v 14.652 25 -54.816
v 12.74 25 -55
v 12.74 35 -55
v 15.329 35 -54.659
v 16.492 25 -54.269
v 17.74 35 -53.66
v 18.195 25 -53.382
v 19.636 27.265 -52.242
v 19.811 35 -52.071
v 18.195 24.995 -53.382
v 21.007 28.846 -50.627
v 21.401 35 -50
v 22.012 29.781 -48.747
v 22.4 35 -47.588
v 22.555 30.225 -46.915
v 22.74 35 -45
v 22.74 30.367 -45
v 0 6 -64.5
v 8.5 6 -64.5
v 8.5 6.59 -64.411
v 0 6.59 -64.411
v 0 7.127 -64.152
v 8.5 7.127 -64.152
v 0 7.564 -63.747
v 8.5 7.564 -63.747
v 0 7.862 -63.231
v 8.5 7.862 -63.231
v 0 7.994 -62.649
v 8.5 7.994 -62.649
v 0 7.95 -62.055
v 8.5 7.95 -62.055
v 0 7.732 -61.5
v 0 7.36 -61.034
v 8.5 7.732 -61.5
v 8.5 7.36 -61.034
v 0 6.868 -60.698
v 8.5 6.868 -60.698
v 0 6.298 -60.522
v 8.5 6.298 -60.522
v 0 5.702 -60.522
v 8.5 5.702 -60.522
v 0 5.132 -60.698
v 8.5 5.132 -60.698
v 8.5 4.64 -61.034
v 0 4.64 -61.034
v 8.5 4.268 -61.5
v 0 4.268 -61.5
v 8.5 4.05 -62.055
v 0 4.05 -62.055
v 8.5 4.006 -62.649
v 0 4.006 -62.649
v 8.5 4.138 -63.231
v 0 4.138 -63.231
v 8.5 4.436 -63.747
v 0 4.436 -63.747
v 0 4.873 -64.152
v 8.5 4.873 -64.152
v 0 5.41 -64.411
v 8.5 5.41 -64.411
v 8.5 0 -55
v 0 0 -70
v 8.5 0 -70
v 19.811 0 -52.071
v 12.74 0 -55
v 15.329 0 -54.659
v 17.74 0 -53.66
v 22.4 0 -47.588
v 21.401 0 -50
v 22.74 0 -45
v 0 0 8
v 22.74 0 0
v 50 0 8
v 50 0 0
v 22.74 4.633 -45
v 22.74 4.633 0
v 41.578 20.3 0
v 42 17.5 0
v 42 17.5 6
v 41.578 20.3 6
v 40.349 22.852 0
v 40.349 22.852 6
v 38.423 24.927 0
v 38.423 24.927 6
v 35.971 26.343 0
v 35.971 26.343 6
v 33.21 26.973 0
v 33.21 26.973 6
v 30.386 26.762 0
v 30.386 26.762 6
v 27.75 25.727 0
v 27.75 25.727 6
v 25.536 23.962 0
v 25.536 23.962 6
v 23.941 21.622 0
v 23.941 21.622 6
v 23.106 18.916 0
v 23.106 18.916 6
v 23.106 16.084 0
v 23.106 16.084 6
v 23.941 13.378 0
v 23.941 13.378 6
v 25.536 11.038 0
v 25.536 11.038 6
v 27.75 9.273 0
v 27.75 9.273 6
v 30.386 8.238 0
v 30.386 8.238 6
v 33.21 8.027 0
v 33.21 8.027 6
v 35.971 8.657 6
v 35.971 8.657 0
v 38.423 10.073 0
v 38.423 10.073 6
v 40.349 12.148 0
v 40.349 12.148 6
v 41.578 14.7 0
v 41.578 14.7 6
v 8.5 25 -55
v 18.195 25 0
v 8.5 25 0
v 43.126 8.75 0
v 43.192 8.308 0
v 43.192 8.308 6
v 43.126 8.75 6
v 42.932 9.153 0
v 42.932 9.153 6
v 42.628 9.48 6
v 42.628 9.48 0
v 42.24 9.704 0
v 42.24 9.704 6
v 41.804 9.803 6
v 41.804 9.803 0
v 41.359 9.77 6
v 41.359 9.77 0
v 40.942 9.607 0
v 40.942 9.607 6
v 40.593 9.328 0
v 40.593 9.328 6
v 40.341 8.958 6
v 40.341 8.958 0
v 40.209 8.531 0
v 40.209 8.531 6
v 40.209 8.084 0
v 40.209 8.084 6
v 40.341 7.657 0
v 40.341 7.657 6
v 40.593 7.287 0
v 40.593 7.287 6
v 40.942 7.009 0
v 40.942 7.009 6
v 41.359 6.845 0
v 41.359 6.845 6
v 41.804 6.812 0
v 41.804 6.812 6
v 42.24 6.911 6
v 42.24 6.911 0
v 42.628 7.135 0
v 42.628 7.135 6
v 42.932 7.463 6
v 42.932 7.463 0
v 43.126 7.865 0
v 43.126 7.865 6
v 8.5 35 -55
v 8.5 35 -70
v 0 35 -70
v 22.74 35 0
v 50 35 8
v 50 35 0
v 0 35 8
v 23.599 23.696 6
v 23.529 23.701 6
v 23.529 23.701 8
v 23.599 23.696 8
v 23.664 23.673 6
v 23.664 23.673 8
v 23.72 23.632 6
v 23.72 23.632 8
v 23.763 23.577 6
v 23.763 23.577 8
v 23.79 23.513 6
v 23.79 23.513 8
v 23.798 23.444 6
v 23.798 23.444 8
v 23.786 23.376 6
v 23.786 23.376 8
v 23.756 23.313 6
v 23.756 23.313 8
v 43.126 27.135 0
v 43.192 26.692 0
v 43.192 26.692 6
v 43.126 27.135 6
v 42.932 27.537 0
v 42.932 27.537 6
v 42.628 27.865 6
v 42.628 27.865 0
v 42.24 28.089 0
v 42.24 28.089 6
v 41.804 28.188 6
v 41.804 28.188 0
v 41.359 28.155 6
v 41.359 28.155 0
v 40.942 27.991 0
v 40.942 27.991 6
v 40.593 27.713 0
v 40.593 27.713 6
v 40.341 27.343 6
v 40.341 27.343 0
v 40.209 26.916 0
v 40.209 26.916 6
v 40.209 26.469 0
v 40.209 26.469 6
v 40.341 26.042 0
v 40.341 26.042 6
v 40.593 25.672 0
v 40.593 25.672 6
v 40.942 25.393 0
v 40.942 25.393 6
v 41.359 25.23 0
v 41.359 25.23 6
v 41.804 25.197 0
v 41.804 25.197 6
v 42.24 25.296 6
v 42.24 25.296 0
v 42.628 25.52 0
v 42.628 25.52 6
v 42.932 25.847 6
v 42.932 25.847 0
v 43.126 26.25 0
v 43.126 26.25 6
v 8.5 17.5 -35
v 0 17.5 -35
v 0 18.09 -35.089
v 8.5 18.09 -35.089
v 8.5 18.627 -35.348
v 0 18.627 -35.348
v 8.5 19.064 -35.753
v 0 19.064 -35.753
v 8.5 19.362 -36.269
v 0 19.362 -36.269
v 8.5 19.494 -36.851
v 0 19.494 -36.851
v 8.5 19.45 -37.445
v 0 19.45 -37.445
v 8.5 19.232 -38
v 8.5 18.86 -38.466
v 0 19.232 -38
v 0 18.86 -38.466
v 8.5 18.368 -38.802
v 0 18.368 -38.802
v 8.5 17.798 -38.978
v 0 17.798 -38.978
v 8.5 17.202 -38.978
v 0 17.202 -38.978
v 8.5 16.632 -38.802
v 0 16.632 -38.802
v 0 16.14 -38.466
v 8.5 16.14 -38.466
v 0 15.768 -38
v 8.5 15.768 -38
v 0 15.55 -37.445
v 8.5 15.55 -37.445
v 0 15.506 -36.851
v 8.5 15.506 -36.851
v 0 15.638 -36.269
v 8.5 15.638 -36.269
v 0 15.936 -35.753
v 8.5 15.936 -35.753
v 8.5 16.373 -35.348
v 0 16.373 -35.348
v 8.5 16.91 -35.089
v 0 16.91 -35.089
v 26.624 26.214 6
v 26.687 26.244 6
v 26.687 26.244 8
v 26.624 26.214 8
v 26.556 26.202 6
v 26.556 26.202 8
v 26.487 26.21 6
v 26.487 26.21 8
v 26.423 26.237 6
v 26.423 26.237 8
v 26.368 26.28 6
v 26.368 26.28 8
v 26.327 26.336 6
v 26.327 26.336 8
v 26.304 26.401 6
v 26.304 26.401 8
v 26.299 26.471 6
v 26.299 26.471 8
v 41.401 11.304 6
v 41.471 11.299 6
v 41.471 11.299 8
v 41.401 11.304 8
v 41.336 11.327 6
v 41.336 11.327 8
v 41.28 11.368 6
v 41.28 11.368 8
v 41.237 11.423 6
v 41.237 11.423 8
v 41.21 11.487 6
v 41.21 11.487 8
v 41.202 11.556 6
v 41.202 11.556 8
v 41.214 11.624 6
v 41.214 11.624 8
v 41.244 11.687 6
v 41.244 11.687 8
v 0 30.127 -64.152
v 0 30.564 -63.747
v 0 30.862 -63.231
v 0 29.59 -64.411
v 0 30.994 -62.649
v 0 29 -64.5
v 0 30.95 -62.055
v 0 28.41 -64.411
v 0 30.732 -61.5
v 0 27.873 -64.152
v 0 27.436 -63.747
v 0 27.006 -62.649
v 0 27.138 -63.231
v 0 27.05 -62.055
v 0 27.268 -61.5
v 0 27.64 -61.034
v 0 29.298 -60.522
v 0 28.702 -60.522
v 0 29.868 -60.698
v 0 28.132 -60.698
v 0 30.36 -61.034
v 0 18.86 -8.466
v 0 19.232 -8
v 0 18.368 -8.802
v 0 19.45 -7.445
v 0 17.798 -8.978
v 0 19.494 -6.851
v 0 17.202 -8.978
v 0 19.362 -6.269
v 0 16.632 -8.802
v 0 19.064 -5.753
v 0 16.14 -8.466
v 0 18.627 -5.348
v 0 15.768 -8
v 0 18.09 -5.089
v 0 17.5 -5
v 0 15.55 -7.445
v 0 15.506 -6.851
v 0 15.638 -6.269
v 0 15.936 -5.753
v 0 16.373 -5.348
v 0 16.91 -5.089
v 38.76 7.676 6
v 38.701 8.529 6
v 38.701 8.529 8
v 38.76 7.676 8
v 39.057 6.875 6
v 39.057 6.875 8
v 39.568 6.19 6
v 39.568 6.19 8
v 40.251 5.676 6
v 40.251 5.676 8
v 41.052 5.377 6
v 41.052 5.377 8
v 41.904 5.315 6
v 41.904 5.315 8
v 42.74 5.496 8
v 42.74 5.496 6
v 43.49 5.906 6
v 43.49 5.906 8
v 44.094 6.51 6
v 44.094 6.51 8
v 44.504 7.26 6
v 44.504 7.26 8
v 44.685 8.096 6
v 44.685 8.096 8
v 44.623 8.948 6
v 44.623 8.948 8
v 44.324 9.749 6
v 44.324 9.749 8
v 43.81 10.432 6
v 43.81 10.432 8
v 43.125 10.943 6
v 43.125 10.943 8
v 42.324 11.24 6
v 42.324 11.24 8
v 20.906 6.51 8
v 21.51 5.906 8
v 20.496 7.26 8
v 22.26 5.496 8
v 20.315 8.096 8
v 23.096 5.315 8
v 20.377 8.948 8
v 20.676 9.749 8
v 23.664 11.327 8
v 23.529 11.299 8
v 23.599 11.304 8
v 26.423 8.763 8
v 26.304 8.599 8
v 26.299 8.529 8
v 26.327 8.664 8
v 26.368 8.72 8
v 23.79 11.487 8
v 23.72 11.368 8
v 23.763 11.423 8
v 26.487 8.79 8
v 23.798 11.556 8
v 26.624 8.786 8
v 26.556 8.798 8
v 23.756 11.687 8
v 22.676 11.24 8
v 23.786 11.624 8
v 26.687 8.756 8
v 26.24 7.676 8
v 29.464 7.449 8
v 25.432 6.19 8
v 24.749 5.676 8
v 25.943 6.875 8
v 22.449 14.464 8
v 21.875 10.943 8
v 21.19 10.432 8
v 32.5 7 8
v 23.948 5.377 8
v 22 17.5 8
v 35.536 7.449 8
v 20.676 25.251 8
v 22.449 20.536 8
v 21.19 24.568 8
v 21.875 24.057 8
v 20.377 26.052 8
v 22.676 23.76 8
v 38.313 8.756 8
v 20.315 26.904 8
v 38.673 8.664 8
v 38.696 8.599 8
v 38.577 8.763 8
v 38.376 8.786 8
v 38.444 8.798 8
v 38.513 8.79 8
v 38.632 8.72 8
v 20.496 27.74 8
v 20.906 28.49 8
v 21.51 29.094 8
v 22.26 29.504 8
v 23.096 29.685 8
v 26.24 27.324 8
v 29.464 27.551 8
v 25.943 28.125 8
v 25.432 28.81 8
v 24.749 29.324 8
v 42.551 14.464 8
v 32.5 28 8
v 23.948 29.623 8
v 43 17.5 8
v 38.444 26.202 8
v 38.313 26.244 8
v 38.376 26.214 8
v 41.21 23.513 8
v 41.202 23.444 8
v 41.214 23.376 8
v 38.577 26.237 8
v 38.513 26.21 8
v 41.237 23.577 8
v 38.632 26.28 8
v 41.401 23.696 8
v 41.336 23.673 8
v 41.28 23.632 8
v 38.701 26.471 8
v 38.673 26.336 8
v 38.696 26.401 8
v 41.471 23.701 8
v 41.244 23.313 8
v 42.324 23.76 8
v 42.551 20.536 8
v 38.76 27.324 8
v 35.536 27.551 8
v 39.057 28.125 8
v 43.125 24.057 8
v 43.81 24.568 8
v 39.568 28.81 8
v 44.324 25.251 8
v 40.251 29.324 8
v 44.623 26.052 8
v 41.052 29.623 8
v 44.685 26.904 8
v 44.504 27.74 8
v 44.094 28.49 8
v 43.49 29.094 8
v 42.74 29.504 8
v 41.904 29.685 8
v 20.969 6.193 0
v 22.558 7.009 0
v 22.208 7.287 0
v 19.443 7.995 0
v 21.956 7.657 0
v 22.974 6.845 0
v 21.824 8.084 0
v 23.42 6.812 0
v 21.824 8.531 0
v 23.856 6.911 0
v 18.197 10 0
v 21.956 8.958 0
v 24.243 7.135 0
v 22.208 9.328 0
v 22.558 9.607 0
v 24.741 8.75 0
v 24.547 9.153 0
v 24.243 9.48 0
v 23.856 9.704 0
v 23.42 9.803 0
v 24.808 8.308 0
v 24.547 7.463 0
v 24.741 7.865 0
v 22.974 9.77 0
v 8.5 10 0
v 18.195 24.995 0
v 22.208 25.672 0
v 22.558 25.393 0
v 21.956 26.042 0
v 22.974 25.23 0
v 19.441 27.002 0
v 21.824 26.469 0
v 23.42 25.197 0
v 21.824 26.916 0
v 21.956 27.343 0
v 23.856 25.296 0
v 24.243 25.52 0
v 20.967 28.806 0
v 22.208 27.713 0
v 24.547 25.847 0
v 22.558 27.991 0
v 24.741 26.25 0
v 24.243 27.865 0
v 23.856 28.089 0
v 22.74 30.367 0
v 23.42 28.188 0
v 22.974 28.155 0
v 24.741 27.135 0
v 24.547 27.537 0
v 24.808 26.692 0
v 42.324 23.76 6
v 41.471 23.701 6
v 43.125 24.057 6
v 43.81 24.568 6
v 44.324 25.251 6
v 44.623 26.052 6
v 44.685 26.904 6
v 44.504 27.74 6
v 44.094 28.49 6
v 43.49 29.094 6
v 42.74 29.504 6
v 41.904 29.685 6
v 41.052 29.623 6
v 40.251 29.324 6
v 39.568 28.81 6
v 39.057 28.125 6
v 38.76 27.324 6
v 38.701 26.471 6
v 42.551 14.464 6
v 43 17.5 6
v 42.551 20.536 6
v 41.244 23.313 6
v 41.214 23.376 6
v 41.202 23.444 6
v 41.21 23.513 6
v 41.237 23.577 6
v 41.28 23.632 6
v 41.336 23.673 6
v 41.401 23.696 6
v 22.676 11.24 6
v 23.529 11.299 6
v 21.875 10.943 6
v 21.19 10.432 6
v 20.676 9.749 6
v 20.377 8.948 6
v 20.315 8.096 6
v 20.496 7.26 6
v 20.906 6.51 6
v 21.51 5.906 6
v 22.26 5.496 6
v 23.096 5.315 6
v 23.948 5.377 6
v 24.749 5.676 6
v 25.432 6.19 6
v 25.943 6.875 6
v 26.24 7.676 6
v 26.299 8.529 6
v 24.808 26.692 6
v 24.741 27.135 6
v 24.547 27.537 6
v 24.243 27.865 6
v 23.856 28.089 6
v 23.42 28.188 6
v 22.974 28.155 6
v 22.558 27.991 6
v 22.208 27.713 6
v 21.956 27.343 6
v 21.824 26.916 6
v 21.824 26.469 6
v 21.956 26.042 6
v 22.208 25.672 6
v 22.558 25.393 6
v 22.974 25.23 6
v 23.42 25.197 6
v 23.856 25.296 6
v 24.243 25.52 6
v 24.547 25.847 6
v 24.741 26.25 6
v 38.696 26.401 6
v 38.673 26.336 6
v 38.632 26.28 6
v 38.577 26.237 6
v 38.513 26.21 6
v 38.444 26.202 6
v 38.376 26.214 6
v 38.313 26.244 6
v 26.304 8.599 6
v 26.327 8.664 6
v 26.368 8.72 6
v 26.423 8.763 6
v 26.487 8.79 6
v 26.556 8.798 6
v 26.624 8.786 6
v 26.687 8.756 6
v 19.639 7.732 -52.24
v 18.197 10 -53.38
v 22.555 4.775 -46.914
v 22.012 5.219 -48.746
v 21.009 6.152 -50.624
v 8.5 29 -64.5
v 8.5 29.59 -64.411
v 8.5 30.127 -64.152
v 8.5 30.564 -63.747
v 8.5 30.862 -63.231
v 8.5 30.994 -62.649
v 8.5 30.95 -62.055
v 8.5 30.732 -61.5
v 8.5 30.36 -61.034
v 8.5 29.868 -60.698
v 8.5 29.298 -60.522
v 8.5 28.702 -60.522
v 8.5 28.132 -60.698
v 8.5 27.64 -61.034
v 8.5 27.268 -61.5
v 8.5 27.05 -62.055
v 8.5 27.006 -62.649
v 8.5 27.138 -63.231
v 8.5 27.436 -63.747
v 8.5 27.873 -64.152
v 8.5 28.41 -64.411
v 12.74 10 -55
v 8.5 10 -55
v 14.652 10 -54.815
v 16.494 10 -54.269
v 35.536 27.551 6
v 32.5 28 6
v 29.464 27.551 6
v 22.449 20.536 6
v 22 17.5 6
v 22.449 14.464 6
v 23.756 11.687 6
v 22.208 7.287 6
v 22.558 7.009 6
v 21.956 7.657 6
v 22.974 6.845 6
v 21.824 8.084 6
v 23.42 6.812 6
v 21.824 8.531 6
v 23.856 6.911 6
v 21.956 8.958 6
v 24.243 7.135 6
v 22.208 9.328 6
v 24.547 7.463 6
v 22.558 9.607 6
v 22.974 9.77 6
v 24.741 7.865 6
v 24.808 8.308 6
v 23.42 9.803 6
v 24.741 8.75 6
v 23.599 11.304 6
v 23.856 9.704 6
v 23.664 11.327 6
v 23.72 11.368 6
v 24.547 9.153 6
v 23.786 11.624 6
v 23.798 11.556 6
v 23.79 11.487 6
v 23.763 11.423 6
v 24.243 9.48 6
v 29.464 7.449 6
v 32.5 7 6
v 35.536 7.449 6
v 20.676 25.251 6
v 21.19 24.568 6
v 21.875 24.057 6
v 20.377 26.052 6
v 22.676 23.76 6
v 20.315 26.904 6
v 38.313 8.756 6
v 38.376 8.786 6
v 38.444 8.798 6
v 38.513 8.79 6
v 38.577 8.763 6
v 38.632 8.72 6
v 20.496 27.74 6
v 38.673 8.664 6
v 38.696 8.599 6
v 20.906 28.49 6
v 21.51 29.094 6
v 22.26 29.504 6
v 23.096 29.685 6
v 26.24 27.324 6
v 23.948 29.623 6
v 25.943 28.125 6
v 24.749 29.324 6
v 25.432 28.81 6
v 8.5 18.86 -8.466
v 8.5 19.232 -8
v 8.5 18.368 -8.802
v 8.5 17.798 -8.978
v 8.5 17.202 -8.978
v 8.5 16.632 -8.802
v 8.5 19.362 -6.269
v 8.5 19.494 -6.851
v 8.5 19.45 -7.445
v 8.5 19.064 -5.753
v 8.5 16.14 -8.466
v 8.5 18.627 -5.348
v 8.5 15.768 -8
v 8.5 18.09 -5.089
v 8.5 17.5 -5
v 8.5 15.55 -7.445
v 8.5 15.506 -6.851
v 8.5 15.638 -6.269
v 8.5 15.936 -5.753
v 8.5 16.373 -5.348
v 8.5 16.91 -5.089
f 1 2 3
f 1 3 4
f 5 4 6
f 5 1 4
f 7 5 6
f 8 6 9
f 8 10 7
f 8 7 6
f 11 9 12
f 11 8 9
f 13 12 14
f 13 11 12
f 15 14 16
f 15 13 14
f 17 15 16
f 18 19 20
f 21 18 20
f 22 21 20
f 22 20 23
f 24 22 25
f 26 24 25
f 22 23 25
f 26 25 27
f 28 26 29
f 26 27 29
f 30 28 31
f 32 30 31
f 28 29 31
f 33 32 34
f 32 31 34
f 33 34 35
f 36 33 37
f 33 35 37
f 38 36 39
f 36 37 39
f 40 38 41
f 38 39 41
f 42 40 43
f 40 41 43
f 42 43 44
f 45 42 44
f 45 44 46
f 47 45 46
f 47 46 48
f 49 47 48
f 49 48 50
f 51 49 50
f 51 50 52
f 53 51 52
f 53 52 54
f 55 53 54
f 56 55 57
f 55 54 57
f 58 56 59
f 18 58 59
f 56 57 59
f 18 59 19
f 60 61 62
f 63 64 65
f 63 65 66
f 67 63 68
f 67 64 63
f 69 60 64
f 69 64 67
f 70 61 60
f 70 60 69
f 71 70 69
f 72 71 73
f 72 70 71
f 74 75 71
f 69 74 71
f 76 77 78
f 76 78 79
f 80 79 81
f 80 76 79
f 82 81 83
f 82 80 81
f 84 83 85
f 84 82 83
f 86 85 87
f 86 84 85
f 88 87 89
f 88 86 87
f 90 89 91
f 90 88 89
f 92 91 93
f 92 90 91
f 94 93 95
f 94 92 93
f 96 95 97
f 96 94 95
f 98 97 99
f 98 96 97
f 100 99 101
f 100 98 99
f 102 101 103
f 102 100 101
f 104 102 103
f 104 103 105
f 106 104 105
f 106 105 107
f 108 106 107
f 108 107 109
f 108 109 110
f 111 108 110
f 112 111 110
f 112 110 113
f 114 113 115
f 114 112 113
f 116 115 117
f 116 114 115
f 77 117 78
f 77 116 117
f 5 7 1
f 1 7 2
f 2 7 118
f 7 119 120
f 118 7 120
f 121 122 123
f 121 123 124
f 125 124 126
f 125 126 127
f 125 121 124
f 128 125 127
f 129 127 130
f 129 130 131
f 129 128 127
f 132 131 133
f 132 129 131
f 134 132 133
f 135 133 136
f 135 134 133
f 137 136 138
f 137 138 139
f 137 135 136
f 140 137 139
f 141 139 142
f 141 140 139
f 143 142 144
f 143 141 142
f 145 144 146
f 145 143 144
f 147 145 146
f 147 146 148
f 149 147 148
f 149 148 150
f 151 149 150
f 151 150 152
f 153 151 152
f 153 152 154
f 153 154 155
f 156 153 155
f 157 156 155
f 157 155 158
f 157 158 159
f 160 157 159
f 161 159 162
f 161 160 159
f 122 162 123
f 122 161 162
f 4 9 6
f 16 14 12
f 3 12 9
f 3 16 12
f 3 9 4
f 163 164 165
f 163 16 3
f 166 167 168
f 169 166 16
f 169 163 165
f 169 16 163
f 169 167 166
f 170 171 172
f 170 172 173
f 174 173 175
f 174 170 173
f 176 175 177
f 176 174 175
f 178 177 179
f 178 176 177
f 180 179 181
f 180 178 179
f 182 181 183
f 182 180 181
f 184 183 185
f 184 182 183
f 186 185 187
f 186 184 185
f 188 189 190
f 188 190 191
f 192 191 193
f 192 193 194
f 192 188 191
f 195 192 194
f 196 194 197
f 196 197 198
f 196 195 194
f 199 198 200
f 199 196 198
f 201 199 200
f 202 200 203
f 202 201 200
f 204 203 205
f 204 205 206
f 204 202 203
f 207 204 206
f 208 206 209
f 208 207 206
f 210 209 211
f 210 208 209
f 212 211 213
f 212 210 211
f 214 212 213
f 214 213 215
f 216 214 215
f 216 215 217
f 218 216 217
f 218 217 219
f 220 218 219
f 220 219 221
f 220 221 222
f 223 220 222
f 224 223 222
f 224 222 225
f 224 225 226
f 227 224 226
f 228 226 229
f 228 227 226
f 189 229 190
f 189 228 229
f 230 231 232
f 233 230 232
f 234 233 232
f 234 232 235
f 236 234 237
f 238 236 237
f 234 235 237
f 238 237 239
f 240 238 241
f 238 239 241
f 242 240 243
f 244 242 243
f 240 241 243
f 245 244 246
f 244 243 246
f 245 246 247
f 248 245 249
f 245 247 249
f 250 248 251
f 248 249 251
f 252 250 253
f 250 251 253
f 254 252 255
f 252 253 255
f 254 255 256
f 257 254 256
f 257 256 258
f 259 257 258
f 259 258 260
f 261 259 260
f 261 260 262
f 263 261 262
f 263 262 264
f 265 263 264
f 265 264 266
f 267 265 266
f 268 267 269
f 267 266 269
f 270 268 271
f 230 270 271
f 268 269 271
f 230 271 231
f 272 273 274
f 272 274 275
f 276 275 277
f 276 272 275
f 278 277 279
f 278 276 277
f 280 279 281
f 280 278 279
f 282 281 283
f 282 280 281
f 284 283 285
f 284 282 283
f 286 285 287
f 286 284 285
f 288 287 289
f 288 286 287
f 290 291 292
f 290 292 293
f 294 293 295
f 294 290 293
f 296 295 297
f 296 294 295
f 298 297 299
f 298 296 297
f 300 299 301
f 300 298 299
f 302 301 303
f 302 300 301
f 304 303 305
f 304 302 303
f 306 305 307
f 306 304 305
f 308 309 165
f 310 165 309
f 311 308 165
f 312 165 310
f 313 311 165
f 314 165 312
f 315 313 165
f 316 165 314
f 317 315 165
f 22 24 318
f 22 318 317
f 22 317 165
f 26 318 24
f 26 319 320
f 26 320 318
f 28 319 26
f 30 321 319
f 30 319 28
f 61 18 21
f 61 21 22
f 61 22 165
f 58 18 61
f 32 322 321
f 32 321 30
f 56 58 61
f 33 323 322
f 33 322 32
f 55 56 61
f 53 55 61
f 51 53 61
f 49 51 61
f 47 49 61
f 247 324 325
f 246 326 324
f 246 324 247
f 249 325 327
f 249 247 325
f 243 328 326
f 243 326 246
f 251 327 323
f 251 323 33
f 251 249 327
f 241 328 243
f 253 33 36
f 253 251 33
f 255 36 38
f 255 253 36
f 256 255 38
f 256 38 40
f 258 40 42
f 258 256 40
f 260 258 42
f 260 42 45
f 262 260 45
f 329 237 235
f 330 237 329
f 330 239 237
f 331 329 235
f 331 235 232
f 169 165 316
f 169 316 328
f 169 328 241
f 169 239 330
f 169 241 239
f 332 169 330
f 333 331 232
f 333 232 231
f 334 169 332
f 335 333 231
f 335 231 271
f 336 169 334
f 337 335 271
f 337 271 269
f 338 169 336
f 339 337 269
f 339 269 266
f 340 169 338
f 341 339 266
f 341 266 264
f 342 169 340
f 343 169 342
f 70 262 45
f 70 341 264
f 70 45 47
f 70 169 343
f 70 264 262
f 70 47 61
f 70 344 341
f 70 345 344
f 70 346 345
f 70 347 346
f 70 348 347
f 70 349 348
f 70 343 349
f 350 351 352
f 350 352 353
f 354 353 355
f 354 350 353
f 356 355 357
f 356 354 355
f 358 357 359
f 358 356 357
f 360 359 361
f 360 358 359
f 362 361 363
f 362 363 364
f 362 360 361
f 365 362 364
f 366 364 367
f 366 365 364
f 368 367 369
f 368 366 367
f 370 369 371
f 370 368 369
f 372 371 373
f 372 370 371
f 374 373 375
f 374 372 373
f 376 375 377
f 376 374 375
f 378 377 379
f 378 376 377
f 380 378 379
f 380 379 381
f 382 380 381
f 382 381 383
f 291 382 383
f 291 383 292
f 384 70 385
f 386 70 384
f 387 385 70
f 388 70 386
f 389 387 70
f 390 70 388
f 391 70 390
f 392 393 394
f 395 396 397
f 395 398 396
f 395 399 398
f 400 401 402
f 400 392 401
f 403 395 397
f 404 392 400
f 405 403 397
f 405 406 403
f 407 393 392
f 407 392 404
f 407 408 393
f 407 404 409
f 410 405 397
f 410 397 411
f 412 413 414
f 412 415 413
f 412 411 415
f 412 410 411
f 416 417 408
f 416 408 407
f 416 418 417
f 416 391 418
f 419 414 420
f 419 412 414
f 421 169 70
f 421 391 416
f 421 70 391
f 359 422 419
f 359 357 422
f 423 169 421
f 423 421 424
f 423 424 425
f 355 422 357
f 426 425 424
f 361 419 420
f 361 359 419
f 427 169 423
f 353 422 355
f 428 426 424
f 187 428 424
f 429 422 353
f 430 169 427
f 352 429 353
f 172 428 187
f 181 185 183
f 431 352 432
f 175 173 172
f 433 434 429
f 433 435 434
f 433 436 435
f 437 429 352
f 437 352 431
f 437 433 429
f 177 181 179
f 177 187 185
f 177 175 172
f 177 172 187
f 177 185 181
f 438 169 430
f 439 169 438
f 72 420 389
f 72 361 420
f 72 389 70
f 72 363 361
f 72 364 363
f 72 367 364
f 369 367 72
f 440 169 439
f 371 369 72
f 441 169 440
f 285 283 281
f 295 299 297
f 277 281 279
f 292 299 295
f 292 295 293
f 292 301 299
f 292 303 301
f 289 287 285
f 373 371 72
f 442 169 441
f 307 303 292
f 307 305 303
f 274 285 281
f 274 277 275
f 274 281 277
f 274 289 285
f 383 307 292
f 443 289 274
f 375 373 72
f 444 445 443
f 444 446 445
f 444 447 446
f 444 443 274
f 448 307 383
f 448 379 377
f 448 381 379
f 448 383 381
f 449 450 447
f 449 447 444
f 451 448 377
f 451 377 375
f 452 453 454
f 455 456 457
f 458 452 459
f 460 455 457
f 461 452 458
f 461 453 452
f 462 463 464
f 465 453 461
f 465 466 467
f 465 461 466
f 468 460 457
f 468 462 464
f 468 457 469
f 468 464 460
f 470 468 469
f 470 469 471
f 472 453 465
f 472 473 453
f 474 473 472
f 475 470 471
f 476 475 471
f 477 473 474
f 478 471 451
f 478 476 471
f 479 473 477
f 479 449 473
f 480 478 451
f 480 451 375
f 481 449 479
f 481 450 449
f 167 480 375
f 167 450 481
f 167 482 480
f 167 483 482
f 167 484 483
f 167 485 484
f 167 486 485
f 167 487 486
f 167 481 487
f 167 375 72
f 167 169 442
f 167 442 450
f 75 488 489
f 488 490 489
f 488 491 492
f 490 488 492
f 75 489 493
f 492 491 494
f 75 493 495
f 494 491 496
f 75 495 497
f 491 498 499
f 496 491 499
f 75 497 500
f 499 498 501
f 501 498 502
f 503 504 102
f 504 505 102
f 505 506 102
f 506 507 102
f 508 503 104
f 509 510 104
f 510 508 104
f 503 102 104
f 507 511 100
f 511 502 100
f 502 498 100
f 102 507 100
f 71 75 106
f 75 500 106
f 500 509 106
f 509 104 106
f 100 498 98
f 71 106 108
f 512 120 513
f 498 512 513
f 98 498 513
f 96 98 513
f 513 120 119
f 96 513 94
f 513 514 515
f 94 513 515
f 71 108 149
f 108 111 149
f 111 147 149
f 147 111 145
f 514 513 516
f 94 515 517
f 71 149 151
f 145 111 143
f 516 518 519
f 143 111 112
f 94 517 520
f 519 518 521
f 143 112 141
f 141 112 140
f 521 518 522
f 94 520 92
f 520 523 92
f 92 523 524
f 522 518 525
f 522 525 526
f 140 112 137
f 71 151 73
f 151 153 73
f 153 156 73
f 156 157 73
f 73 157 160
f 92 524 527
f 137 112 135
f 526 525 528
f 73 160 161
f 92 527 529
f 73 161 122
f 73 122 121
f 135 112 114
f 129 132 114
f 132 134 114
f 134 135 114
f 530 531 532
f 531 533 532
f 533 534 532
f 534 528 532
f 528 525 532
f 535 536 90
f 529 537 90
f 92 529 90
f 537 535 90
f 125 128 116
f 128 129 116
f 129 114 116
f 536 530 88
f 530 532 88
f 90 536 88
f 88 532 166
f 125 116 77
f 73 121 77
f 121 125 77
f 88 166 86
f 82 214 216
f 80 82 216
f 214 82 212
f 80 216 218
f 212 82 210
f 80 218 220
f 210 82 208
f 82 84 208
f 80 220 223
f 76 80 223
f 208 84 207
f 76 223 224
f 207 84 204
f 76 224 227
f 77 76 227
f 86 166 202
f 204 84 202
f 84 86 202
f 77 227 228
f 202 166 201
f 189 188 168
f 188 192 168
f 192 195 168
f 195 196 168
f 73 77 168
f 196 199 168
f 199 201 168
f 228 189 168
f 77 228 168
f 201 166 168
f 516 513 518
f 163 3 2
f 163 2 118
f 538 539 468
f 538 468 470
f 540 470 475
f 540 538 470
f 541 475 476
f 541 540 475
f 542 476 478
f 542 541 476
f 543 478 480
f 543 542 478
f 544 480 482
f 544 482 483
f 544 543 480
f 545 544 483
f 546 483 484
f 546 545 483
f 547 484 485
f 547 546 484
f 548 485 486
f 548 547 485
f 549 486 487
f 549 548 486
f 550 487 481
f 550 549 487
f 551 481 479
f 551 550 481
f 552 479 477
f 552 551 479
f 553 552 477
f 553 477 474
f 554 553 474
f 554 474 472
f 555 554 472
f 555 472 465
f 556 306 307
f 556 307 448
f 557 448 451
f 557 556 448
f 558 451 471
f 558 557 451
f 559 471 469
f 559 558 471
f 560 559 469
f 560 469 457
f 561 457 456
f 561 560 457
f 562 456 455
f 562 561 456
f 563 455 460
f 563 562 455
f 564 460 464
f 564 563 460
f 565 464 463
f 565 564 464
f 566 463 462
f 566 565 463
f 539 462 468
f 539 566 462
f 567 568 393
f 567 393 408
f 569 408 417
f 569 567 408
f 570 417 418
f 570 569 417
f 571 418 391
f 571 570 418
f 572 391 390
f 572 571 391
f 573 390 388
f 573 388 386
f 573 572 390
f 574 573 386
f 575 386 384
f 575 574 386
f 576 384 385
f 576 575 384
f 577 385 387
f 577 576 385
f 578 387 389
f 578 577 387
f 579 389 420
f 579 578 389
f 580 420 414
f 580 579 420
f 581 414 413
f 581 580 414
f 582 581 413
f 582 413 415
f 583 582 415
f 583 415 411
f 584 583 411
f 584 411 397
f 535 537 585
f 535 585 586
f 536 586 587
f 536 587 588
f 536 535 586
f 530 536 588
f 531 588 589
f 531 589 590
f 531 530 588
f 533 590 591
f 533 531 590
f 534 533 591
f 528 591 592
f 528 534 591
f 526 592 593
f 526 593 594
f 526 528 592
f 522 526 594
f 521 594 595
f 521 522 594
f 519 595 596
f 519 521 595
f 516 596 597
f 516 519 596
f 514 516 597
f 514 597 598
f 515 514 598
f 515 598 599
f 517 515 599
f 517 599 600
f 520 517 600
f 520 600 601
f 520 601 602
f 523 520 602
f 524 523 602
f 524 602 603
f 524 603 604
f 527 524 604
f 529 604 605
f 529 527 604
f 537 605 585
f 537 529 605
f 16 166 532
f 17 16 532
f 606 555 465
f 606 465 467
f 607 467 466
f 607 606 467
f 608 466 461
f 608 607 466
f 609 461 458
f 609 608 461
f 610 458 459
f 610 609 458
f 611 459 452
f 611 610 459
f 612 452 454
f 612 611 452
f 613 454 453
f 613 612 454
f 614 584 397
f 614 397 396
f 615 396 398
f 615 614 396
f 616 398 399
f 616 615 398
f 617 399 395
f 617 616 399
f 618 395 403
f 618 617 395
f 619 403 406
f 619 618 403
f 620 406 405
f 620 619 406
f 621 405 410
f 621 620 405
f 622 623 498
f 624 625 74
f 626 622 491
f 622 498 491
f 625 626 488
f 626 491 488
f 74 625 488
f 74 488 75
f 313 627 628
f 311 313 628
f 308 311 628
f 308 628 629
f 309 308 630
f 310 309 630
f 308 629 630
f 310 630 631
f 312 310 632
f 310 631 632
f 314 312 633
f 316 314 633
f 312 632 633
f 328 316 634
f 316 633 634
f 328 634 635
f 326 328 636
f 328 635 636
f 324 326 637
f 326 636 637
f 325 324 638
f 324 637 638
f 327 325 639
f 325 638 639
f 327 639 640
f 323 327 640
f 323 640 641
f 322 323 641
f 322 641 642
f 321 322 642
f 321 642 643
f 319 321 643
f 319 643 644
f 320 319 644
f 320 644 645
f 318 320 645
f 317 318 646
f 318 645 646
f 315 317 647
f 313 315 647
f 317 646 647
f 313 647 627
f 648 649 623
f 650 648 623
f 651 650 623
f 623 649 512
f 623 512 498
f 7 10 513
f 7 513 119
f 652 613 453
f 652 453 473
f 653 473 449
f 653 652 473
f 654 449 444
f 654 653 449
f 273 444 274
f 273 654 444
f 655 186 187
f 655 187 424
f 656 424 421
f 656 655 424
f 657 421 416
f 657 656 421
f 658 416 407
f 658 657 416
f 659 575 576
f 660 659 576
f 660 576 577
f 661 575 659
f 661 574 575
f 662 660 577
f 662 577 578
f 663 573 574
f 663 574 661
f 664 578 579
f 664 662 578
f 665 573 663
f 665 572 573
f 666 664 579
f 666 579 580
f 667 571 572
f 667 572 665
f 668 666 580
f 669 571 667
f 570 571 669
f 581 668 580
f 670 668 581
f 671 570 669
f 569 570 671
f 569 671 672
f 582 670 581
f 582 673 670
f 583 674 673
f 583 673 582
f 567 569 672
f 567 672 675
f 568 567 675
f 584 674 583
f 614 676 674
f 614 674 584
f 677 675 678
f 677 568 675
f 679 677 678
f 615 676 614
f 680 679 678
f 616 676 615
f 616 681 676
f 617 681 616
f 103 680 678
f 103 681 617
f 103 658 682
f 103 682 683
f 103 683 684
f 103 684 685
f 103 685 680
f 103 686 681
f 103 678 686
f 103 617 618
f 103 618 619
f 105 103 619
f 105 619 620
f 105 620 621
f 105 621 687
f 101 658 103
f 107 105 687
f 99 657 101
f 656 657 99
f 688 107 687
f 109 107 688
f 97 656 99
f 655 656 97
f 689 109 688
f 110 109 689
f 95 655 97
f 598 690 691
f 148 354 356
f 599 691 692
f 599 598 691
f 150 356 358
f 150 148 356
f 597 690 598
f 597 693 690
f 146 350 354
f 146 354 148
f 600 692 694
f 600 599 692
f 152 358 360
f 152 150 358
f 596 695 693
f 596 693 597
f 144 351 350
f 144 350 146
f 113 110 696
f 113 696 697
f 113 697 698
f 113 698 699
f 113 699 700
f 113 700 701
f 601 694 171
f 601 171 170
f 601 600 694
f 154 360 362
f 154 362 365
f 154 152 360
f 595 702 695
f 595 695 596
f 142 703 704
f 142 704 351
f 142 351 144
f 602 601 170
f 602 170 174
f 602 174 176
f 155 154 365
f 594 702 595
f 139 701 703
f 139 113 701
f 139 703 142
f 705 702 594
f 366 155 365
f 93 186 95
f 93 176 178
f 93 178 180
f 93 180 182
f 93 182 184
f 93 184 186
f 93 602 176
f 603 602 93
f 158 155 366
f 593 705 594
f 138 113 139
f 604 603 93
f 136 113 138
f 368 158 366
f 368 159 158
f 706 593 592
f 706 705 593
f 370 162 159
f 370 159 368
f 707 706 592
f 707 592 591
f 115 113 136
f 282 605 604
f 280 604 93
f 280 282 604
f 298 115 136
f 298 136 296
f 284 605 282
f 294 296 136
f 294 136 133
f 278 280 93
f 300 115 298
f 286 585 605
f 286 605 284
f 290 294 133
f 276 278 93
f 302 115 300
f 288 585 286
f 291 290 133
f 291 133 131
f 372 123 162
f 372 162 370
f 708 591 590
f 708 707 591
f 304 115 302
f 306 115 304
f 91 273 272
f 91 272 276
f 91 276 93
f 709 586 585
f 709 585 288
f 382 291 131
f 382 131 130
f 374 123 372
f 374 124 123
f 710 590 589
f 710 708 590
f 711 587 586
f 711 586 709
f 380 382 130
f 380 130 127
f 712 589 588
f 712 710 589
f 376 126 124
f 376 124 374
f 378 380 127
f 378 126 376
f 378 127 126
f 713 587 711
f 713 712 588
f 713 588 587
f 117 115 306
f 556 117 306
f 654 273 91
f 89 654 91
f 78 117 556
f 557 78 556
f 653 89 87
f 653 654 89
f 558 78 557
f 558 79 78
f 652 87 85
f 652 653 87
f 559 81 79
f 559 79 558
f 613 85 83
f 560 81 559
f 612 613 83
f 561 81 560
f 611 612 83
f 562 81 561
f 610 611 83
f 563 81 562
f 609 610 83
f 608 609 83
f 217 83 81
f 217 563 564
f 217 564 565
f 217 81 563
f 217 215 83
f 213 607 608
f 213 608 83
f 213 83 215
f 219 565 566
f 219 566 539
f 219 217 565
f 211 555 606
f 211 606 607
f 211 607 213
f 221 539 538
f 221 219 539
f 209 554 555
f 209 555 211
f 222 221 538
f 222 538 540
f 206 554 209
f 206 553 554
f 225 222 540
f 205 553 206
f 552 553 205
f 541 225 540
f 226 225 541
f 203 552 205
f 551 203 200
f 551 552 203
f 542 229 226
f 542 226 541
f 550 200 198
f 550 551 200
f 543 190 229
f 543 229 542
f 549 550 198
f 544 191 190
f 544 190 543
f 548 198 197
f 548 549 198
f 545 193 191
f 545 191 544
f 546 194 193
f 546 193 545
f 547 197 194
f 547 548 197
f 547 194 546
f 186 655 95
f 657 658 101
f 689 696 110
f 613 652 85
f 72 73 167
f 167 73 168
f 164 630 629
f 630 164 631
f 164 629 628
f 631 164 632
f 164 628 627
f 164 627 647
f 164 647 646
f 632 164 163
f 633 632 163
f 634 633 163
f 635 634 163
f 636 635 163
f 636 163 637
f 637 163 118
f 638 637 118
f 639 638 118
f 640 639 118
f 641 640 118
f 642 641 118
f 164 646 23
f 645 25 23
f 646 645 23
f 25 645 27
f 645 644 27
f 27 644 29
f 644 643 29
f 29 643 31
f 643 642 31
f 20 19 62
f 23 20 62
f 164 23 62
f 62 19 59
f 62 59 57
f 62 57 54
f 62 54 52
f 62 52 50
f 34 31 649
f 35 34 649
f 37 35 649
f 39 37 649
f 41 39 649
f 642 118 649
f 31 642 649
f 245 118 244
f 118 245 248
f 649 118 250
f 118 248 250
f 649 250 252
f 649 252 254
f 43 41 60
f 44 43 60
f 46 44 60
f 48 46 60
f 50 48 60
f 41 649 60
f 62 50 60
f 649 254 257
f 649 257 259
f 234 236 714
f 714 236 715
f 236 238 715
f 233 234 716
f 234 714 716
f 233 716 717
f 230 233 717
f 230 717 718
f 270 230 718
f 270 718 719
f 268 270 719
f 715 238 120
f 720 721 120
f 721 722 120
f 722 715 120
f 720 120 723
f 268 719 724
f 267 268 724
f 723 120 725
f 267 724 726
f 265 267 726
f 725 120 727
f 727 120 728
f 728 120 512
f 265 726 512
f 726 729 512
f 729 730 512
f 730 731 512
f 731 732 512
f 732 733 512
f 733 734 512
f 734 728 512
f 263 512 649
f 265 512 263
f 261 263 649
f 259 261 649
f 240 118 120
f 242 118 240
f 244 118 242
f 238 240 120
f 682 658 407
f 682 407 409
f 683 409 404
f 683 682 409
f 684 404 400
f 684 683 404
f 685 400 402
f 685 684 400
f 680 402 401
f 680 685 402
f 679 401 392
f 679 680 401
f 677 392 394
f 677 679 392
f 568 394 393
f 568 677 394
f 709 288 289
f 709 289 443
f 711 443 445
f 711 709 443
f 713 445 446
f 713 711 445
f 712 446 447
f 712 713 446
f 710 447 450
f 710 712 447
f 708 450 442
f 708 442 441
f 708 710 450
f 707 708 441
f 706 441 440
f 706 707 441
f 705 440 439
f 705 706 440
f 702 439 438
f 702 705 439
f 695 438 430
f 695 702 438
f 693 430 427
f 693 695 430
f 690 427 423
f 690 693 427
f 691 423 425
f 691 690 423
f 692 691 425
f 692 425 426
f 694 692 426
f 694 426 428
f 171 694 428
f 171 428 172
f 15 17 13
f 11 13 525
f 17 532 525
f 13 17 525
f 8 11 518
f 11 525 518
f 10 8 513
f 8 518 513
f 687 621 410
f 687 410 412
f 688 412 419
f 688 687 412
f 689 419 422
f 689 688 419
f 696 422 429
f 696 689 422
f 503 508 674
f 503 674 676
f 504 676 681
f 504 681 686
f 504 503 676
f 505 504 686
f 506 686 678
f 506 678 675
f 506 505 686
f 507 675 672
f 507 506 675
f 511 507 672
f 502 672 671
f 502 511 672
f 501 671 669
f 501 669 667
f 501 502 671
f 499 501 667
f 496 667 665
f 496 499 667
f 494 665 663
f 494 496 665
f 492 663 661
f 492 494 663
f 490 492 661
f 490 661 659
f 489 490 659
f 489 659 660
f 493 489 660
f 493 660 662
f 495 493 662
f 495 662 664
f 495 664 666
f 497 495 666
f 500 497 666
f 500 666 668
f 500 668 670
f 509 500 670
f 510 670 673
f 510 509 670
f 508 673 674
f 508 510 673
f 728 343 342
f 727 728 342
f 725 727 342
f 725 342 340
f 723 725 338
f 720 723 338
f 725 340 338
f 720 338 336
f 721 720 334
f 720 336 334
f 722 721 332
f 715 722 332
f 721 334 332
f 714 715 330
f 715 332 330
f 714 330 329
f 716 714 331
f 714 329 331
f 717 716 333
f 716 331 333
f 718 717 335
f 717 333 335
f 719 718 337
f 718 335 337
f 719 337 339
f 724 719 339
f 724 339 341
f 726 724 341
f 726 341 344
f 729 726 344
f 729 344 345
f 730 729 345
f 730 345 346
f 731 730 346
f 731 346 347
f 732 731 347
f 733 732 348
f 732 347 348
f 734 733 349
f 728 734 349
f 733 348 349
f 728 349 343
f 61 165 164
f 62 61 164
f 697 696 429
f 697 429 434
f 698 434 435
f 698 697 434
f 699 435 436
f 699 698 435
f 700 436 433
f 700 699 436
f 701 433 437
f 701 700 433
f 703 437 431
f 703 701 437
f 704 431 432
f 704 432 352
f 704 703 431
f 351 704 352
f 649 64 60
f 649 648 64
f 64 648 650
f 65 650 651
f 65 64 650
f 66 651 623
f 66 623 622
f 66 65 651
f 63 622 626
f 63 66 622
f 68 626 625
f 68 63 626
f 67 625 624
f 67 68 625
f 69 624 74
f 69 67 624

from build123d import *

# Parameters (mm, degrees)
SKETCH1_W           = 50
SKETCH1_H           = 35
SKETCH1_R           = 9.5
SKETCH1_R_2         = 1.5
BOSS_EXTRUDE3_DEPTH = 6
SKETCH4_W           = 50
SKETCH4_H           = 35
BOSS_EXTRUDE5_DEPTH = 2
BOSS_EXTRUDE6_DEPTH = 55
SKETCH9_R           = 2
CUT_EXTRUDE1_DEPTH  = 8.5
BOSS_EXTRUDE7_DEPTH = 15
FILLET1_R           = 10
FILLET8_R           = 10
SKETCH16_R          = 2
CUT_EXTRUDE2_DEPTH  = 8.5


with BuildPart() as part:
    # Sketch1 → Boss-Extrude3 (new body)
    with BuildSketch(Plane.XY):
        with Locations((25, 17.5)):
            Rectangle(SKETCH1_W, SKETCH1_H)
        with Locations((32.5, 17.5)):
            Circle(SKETCH1_R, mode=Mode.SUBTRACT)
        with Locations((41.692388155, 26.692388155)):
            Circle(SKETCH1_R_2, mode=Mode.SUBTRACT)
        with Locations((41.692388155, 8.307611845)):
            Circle(SKETCH1_R_2, mode=Mode.SUBTRACT)
        with Locations((23.307611845, 8.307611845)):
            Circle(SKETCH1_R_2, mode=Mode.SUBTRACT)
        with Locations((23.307611845, 26.692388155)):
            Circle(SKETCH1_R_2, mode=Mode.SUBTRACT)
    extrude(amount=BOSS_EXTRUDE3_DEPTH)

    # Sketch4 → Boss-Extrude5 (add)
    with BuildSketch(Plane.XY.offset(6)):
        with Locations((25, 17.5)):
            Rectangle(SKETCH4_W, SKETCH4_H)
        with BuildLine():
            ThreePointArc((26.299419693, 26.47083501), (21.186291501, 28.813708499), (23.52916499, 23.700580307))
            ThreePointArc((23.52916499, 23.700580307), (23.763454109, 23.57743344), (23.755822455, 23.312861521))
            ThreePointArc((23.755822455, 23.312861521), (22, 17.5), (23.755822455, 11.687138479))
            ThreePointArc((23.755822455, 11.687138479), (23.763454109, 11.42256656), (23.52916499, 11.299419693))
            ThreePointArc((23.52916499, 11.299419693), (21.186291501, 6.186291501), (26.299419693, 8.52916499))
            ThreePointArc((26.299419693, 8.52916499), (26.42256656, 8.763454109), (26.687138479, 8.755822455))
            ThreePointArc((26.687138479, 8.755822455), (32.5, 7), (38.312861521, 8.755822455))
            ThreePointArc((38.312861521, 8.755822455), (38.57743344, 8.763454109), (38.700580307, 8.52916499))
            ThreePointArc((38.700580307, 8.52916499), (43.813708499, 6.186291501), (41.47083501, 11.299419693))
            ThreePointArc((41.47083501, 11.299419693), (41.236545891, 11.42256656), (41.244177545, 11.687138479))
            ThreePointArc((41.244177545, 11.687138479), (43, 17.5), (41.244177545, 23.312861521))
            ThreePointArc((41.244177545, 23.312861521), (41.236545891, 23.57743344), (41.47083501, 23.700580307))
            ThreePointArc((41.47083501, 23.700580307), (43.813708499, 28.813708499), (38.700580307, 26.47083501))
            ThreePointArc((38.700580307, 26.47083501), (38.57743344, 26.236545891), (38.312861521, 26.244177545))
            ThreePointArc((38.312861521, 26.244177545), (32.5, 28), (26.687138479, 26.244177545))
            ThreePointArc((26.687138479, 26.244177545), (26.42256656, 26.236545891), (26.299419693, 26.47083501))
        make_face(mode=Mode.SUBTRACT)
    extrude(amount=BOSS_EXTRUDE5_DEPTH)

    # Sketch8 → Boss-Extrude6 (add)
    with BuildSketch(Plane(origin=(0, 0, 0), x_dir=(-1, 0, 0), z_dir=(0, 0, -1))):
        with BuildLine():
            Line((-8.5, 35), (-22.740329685, 35))
            Line((-22.740329685, 35), (-22.740329685, 30.367452558))
            ThreePointArc((-22.740329685, 30.367452558), (-20.171344576, 27.9320063), (-18.194683381, 24.99535966))
            Line((-18.194683381, 24.99535966), (-18.194683381, 25))
            Line((-18.194683381, 25), (-8.5, 25))
            Line((-8.5, 25), (-8.5, 10.000000197))
            Line((-8.5, 10.000000197), (-18.197115572, 10.000000197))
            ThreePointArc((-18.197115572, 10.000000197), (-20.17303677, 7.065994176), (-22.740329685, 4.632547442))
            Line((-22.740329685, 4.632547442), (-22.740329685, 0))
            Line((-22.740329685, 0), (-8.5, 0))
            Line((-8.5, 0), (0, 0))
            Line((0, 0), (0, 10.000000197))
            Line((0, 10.000000197), (0, 25))
            Line((0, 25), (0, 35))
            Line((0, 35), (-8.5, 35))
        make_face()
    extrude(amount=BOSS_EXTRUDE6_DEPTH)

    # Sketch9 → Cut-Extrude1 (cut)
    with BuildSketch(Plane.ZY):
        with Locations((-7, 17.5)):
            Circle(SKETCH9_R)
        with Locations((-37, 17.5)):
            Circle(SKETCH9_R)
    extrude(amount=-CUT_EXTRUDE1_DEPTH, mode=Mode.SUBTRACT)

    # Sketch11 → Boss-Extrude7 (add)
    with BuildSketch(Plane(origin=(0, 0, -55), x_dir=(-1, 0, 0), z_dir=(0, 0, -1))):
        Polygon((-8.5, 10.000000197), (-8.5, 35), (0, 35), (0, 0), (-8.5, 0), align=None)
    extrude(amount=BOSS_EXTRUDE7_DEPTH)

    # Fillet1
    fillet1_edges = [part.edges().sort_by_distance(p)[0] for p in [
        (22.740329685, 32.683726279, -55),
    ]]
    fillet(fillet1_edges, radius=FILLET1_R)

    # Fillet8
    fillet8_edges = [part.edges().sort_by_distance(p)[0] for p in [
        (22.740329685, 2.316273721, -55),
    ]]
    fillet(fillet8_edges, radius=FILLET8_R)

    # Sketch16 → Cut-Extrude2 (cut)
    with BuildSketch(Plane(origin=(8.5, 0, 0), x_dir=(0, 0, -1), z_dir=(1, 0, 0))):
        with Locations((62.5, 29.000000197)):
            Circle(SKETCH16_R)
        with Locations((62.5, 6)):
            Circle(SKETCH16_R)
    extrude(amount=-CUT_EXTRUDE2_DEPTH, mode=Mode.SUBTRACT)


solid = part.part
